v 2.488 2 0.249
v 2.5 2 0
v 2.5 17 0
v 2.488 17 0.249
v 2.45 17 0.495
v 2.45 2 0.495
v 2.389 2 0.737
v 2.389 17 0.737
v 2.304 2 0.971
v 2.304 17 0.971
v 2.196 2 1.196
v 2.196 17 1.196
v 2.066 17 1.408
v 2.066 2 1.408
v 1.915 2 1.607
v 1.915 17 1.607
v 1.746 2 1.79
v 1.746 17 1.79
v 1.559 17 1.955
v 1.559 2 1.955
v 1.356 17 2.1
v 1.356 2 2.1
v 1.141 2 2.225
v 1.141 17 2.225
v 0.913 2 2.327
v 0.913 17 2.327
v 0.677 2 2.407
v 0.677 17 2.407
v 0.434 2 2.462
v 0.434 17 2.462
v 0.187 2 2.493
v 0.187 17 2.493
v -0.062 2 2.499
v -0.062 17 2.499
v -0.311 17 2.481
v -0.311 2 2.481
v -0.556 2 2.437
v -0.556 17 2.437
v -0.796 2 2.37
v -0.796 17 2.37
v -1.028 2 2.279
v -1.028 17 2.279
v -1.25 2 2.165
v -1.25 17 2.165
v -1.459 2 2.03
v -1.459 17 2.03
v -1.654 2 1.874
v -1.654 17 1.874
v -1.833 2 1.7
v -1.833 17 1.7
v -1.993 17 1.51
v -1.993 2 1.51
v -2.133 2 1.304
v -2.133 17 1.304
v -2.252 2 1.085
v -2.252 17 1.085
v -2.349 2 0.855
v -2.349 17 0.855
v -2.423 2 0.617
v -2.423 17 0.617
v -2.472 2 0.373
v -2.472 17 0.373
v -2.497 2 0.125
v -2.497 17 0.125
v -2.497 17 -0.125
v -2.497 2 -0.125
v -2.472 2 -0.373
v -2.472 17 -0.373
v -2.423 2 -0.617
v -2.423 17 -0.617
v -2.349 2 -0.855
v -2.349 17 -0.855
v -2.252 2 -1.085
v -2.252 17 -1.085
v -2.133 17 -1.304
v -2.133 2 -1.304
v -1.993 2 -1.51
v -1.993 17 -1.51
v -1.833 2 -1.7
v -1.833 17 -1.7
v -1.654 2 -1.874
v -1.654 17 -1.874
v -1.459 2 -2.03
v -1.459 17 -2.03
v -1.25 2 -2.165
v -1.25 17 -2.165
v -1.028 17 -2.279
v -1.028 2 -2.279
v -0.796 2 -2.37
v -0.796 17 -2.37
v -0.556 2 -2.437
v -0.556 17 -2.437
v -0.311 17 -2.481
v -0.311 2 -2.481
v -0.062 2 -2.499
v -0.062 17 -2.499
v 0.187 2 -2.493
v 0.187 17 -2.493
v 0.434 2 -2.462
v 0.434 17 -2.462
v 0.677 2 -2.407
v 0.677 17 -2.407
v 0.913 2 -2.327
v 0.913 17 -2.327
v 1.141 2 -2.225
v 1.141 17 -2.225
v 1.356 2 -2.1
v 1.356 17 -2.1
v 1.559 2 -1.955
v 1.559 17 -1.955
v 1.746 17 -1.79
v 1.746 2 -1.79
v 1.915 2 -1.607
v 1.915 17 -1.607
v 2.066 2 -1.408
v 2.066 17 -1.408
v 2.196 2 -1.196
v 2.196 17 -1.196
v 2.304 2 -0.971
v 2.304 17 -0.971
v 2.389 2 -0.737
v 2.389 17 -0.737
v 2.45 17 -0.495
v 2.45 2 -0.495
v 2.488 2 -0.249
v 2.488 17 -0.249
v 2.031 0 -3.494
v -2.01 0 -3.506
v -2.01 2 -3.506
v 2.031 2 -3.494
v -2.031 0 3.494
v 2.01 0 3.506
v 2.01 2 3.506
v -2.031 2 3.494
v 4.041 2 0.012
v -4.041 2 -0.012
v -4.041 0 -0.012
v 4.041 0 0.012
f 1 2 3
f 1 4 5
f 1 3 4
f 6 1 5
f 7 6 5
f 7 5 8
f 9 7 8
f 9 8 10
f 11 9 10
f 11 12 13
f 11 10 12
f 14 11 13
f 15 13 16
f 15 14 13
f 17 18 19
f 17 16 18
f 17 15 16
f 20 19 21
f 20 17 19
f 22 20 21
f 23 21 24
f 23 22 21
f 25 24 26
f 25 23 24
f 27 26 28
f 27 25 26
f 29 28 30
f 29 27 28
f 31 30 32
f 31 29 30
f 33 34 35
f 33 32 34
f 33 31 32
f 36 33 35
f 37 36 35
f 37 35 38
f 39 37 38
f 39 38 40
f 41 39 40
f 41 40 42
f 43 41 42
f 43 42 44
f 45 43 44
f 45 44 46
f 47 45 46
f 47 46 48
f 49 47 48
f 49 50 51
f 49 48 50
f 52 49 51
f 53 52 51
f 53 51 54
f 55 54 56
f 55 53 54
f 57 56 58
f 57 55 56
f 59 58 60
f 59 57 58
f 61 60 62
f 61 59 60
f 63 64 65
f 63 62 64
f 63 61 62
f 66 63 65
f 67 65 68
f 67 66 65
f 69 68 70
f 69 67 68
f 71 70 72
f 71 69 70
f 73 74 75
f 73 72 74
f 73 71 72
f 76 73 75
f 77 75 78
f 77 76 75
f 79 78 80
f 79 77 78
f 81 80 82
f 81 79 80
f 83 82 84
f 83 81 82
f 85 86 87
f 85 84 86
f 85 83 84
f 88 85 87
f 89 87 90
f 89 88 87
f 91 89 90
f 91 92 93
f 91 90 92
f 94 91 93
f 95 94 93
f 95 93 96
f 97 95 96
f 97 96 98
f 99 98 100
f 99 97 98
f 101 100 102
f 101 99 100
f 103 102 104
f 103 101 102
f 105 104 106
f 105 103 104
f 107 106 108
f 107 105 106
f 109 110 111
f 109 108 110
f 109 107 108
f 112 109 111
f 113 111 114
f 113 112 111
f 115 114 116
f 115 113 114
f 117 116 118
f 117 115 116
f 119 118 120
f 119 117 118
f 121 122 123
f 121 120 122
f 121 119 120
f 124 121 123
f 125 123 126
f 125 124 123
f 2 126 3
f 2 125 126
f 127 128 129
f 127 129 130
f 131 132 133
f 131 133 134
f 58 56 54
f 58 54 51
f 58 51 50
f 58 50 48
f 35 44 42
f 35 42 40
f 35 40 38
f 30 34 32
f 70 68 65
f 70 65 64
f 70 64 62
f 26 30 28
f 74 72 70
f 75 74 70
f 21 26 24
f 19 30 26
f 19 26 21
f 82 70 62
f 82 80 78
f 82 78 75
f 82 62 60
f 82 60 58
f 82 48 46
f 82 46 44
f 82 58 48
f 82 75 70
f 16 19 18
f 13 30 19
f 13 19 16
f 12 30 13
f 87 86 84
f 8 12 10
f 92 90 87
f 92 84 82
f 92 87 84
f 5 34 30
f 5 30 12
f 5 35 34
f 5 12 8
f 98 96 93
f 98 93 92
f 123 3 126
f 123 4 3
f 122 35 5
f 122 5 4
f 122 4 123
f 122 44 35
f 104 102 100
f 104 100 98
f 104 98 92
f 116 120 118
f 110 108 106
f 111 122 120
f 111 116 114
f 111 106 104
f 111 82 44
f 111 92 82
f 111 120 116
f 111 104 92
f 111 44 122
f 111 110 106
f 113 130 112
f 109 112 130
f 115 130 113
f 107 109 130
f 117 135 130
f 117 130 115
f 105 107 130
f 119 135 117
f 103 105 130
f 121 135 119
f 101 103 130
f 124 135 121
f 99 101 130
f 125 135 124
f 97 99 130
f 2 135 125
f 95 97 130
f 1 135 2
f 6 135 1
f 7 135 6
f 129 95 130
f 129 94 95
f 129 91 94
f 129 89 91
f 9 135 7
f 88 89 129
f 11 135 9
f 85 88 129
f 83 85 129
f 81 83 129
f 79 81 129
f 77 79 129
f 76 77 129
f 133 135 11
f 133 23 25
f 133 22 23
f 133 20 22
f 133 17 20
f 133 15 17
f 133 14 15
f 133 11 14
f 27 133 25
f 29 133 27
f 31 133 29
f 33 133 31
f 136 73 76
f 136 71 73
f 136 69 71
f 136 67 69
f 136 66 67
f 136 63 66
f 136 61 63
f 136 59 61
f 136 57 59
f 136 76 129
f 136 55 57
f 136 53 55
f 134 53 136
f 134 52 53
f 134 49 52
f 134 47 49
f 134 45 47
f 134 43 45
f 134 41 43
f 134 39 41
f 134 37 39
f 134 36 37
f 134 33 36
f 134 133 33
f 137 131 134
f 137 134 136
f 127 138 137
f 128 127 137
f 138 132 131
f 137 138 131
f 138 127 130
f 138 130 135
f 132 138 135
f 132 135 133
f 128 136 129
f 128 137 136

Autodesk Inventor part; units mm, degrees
ref_plane "YZ Plane" through (0, 0, 0) normal (1, 0, 0) x (0, 1, 0)
ref_plane "XZ Plane" through (0, 0, 0) normal (0, 1, 0) x (-1, 0, 0)
ref_plane "XY Plane" through (0, 0, 0) normal (0, 0, 1) x (1, 0, 0)
sketch "Sketch1" plane through (0, 0, 0) normal (0, 1, 0) x (-1, 0, 0)
  line L0 (-2.0311, -3.494) -> (-4.0414, 0.012)
  line L1 (-4.0414, 0.012) -> (-2.0104, 3.506)
  line L2 (-2.0104, 3.506) -> (2.0311, 3.494)
  line L3 (2.0311, 3.494) -> (4.0414, -0.012)
  line L4 (4.0414, -0.012) -> (2.0104, -3.506)
  line L5 (2.0104, -3.506) -> (-2.0311, -3.494)
  point P0 (0, 0)
  point P1 (0, 0)
  dimension "d0" = 7
extrude "Extrusion1" add sketch "Sketch1" along normal blind 2
sketch "Sketch2" plane through (0, 2, 0) normal (0, 1, 0) x (1, 0, 0)
  circle A0 centre (0, 0) radius 2.5
  dimension "d3" = 5
extrude "Extrusion2" add sketch "Sketch2" along normal blind 15
sketch "Sketch3" plane through (0, 17, 0) normal (0, 1, 0) x (1, 0, 0)
  point P0 (0, 0)
properties part number "Screw 5 mm"
